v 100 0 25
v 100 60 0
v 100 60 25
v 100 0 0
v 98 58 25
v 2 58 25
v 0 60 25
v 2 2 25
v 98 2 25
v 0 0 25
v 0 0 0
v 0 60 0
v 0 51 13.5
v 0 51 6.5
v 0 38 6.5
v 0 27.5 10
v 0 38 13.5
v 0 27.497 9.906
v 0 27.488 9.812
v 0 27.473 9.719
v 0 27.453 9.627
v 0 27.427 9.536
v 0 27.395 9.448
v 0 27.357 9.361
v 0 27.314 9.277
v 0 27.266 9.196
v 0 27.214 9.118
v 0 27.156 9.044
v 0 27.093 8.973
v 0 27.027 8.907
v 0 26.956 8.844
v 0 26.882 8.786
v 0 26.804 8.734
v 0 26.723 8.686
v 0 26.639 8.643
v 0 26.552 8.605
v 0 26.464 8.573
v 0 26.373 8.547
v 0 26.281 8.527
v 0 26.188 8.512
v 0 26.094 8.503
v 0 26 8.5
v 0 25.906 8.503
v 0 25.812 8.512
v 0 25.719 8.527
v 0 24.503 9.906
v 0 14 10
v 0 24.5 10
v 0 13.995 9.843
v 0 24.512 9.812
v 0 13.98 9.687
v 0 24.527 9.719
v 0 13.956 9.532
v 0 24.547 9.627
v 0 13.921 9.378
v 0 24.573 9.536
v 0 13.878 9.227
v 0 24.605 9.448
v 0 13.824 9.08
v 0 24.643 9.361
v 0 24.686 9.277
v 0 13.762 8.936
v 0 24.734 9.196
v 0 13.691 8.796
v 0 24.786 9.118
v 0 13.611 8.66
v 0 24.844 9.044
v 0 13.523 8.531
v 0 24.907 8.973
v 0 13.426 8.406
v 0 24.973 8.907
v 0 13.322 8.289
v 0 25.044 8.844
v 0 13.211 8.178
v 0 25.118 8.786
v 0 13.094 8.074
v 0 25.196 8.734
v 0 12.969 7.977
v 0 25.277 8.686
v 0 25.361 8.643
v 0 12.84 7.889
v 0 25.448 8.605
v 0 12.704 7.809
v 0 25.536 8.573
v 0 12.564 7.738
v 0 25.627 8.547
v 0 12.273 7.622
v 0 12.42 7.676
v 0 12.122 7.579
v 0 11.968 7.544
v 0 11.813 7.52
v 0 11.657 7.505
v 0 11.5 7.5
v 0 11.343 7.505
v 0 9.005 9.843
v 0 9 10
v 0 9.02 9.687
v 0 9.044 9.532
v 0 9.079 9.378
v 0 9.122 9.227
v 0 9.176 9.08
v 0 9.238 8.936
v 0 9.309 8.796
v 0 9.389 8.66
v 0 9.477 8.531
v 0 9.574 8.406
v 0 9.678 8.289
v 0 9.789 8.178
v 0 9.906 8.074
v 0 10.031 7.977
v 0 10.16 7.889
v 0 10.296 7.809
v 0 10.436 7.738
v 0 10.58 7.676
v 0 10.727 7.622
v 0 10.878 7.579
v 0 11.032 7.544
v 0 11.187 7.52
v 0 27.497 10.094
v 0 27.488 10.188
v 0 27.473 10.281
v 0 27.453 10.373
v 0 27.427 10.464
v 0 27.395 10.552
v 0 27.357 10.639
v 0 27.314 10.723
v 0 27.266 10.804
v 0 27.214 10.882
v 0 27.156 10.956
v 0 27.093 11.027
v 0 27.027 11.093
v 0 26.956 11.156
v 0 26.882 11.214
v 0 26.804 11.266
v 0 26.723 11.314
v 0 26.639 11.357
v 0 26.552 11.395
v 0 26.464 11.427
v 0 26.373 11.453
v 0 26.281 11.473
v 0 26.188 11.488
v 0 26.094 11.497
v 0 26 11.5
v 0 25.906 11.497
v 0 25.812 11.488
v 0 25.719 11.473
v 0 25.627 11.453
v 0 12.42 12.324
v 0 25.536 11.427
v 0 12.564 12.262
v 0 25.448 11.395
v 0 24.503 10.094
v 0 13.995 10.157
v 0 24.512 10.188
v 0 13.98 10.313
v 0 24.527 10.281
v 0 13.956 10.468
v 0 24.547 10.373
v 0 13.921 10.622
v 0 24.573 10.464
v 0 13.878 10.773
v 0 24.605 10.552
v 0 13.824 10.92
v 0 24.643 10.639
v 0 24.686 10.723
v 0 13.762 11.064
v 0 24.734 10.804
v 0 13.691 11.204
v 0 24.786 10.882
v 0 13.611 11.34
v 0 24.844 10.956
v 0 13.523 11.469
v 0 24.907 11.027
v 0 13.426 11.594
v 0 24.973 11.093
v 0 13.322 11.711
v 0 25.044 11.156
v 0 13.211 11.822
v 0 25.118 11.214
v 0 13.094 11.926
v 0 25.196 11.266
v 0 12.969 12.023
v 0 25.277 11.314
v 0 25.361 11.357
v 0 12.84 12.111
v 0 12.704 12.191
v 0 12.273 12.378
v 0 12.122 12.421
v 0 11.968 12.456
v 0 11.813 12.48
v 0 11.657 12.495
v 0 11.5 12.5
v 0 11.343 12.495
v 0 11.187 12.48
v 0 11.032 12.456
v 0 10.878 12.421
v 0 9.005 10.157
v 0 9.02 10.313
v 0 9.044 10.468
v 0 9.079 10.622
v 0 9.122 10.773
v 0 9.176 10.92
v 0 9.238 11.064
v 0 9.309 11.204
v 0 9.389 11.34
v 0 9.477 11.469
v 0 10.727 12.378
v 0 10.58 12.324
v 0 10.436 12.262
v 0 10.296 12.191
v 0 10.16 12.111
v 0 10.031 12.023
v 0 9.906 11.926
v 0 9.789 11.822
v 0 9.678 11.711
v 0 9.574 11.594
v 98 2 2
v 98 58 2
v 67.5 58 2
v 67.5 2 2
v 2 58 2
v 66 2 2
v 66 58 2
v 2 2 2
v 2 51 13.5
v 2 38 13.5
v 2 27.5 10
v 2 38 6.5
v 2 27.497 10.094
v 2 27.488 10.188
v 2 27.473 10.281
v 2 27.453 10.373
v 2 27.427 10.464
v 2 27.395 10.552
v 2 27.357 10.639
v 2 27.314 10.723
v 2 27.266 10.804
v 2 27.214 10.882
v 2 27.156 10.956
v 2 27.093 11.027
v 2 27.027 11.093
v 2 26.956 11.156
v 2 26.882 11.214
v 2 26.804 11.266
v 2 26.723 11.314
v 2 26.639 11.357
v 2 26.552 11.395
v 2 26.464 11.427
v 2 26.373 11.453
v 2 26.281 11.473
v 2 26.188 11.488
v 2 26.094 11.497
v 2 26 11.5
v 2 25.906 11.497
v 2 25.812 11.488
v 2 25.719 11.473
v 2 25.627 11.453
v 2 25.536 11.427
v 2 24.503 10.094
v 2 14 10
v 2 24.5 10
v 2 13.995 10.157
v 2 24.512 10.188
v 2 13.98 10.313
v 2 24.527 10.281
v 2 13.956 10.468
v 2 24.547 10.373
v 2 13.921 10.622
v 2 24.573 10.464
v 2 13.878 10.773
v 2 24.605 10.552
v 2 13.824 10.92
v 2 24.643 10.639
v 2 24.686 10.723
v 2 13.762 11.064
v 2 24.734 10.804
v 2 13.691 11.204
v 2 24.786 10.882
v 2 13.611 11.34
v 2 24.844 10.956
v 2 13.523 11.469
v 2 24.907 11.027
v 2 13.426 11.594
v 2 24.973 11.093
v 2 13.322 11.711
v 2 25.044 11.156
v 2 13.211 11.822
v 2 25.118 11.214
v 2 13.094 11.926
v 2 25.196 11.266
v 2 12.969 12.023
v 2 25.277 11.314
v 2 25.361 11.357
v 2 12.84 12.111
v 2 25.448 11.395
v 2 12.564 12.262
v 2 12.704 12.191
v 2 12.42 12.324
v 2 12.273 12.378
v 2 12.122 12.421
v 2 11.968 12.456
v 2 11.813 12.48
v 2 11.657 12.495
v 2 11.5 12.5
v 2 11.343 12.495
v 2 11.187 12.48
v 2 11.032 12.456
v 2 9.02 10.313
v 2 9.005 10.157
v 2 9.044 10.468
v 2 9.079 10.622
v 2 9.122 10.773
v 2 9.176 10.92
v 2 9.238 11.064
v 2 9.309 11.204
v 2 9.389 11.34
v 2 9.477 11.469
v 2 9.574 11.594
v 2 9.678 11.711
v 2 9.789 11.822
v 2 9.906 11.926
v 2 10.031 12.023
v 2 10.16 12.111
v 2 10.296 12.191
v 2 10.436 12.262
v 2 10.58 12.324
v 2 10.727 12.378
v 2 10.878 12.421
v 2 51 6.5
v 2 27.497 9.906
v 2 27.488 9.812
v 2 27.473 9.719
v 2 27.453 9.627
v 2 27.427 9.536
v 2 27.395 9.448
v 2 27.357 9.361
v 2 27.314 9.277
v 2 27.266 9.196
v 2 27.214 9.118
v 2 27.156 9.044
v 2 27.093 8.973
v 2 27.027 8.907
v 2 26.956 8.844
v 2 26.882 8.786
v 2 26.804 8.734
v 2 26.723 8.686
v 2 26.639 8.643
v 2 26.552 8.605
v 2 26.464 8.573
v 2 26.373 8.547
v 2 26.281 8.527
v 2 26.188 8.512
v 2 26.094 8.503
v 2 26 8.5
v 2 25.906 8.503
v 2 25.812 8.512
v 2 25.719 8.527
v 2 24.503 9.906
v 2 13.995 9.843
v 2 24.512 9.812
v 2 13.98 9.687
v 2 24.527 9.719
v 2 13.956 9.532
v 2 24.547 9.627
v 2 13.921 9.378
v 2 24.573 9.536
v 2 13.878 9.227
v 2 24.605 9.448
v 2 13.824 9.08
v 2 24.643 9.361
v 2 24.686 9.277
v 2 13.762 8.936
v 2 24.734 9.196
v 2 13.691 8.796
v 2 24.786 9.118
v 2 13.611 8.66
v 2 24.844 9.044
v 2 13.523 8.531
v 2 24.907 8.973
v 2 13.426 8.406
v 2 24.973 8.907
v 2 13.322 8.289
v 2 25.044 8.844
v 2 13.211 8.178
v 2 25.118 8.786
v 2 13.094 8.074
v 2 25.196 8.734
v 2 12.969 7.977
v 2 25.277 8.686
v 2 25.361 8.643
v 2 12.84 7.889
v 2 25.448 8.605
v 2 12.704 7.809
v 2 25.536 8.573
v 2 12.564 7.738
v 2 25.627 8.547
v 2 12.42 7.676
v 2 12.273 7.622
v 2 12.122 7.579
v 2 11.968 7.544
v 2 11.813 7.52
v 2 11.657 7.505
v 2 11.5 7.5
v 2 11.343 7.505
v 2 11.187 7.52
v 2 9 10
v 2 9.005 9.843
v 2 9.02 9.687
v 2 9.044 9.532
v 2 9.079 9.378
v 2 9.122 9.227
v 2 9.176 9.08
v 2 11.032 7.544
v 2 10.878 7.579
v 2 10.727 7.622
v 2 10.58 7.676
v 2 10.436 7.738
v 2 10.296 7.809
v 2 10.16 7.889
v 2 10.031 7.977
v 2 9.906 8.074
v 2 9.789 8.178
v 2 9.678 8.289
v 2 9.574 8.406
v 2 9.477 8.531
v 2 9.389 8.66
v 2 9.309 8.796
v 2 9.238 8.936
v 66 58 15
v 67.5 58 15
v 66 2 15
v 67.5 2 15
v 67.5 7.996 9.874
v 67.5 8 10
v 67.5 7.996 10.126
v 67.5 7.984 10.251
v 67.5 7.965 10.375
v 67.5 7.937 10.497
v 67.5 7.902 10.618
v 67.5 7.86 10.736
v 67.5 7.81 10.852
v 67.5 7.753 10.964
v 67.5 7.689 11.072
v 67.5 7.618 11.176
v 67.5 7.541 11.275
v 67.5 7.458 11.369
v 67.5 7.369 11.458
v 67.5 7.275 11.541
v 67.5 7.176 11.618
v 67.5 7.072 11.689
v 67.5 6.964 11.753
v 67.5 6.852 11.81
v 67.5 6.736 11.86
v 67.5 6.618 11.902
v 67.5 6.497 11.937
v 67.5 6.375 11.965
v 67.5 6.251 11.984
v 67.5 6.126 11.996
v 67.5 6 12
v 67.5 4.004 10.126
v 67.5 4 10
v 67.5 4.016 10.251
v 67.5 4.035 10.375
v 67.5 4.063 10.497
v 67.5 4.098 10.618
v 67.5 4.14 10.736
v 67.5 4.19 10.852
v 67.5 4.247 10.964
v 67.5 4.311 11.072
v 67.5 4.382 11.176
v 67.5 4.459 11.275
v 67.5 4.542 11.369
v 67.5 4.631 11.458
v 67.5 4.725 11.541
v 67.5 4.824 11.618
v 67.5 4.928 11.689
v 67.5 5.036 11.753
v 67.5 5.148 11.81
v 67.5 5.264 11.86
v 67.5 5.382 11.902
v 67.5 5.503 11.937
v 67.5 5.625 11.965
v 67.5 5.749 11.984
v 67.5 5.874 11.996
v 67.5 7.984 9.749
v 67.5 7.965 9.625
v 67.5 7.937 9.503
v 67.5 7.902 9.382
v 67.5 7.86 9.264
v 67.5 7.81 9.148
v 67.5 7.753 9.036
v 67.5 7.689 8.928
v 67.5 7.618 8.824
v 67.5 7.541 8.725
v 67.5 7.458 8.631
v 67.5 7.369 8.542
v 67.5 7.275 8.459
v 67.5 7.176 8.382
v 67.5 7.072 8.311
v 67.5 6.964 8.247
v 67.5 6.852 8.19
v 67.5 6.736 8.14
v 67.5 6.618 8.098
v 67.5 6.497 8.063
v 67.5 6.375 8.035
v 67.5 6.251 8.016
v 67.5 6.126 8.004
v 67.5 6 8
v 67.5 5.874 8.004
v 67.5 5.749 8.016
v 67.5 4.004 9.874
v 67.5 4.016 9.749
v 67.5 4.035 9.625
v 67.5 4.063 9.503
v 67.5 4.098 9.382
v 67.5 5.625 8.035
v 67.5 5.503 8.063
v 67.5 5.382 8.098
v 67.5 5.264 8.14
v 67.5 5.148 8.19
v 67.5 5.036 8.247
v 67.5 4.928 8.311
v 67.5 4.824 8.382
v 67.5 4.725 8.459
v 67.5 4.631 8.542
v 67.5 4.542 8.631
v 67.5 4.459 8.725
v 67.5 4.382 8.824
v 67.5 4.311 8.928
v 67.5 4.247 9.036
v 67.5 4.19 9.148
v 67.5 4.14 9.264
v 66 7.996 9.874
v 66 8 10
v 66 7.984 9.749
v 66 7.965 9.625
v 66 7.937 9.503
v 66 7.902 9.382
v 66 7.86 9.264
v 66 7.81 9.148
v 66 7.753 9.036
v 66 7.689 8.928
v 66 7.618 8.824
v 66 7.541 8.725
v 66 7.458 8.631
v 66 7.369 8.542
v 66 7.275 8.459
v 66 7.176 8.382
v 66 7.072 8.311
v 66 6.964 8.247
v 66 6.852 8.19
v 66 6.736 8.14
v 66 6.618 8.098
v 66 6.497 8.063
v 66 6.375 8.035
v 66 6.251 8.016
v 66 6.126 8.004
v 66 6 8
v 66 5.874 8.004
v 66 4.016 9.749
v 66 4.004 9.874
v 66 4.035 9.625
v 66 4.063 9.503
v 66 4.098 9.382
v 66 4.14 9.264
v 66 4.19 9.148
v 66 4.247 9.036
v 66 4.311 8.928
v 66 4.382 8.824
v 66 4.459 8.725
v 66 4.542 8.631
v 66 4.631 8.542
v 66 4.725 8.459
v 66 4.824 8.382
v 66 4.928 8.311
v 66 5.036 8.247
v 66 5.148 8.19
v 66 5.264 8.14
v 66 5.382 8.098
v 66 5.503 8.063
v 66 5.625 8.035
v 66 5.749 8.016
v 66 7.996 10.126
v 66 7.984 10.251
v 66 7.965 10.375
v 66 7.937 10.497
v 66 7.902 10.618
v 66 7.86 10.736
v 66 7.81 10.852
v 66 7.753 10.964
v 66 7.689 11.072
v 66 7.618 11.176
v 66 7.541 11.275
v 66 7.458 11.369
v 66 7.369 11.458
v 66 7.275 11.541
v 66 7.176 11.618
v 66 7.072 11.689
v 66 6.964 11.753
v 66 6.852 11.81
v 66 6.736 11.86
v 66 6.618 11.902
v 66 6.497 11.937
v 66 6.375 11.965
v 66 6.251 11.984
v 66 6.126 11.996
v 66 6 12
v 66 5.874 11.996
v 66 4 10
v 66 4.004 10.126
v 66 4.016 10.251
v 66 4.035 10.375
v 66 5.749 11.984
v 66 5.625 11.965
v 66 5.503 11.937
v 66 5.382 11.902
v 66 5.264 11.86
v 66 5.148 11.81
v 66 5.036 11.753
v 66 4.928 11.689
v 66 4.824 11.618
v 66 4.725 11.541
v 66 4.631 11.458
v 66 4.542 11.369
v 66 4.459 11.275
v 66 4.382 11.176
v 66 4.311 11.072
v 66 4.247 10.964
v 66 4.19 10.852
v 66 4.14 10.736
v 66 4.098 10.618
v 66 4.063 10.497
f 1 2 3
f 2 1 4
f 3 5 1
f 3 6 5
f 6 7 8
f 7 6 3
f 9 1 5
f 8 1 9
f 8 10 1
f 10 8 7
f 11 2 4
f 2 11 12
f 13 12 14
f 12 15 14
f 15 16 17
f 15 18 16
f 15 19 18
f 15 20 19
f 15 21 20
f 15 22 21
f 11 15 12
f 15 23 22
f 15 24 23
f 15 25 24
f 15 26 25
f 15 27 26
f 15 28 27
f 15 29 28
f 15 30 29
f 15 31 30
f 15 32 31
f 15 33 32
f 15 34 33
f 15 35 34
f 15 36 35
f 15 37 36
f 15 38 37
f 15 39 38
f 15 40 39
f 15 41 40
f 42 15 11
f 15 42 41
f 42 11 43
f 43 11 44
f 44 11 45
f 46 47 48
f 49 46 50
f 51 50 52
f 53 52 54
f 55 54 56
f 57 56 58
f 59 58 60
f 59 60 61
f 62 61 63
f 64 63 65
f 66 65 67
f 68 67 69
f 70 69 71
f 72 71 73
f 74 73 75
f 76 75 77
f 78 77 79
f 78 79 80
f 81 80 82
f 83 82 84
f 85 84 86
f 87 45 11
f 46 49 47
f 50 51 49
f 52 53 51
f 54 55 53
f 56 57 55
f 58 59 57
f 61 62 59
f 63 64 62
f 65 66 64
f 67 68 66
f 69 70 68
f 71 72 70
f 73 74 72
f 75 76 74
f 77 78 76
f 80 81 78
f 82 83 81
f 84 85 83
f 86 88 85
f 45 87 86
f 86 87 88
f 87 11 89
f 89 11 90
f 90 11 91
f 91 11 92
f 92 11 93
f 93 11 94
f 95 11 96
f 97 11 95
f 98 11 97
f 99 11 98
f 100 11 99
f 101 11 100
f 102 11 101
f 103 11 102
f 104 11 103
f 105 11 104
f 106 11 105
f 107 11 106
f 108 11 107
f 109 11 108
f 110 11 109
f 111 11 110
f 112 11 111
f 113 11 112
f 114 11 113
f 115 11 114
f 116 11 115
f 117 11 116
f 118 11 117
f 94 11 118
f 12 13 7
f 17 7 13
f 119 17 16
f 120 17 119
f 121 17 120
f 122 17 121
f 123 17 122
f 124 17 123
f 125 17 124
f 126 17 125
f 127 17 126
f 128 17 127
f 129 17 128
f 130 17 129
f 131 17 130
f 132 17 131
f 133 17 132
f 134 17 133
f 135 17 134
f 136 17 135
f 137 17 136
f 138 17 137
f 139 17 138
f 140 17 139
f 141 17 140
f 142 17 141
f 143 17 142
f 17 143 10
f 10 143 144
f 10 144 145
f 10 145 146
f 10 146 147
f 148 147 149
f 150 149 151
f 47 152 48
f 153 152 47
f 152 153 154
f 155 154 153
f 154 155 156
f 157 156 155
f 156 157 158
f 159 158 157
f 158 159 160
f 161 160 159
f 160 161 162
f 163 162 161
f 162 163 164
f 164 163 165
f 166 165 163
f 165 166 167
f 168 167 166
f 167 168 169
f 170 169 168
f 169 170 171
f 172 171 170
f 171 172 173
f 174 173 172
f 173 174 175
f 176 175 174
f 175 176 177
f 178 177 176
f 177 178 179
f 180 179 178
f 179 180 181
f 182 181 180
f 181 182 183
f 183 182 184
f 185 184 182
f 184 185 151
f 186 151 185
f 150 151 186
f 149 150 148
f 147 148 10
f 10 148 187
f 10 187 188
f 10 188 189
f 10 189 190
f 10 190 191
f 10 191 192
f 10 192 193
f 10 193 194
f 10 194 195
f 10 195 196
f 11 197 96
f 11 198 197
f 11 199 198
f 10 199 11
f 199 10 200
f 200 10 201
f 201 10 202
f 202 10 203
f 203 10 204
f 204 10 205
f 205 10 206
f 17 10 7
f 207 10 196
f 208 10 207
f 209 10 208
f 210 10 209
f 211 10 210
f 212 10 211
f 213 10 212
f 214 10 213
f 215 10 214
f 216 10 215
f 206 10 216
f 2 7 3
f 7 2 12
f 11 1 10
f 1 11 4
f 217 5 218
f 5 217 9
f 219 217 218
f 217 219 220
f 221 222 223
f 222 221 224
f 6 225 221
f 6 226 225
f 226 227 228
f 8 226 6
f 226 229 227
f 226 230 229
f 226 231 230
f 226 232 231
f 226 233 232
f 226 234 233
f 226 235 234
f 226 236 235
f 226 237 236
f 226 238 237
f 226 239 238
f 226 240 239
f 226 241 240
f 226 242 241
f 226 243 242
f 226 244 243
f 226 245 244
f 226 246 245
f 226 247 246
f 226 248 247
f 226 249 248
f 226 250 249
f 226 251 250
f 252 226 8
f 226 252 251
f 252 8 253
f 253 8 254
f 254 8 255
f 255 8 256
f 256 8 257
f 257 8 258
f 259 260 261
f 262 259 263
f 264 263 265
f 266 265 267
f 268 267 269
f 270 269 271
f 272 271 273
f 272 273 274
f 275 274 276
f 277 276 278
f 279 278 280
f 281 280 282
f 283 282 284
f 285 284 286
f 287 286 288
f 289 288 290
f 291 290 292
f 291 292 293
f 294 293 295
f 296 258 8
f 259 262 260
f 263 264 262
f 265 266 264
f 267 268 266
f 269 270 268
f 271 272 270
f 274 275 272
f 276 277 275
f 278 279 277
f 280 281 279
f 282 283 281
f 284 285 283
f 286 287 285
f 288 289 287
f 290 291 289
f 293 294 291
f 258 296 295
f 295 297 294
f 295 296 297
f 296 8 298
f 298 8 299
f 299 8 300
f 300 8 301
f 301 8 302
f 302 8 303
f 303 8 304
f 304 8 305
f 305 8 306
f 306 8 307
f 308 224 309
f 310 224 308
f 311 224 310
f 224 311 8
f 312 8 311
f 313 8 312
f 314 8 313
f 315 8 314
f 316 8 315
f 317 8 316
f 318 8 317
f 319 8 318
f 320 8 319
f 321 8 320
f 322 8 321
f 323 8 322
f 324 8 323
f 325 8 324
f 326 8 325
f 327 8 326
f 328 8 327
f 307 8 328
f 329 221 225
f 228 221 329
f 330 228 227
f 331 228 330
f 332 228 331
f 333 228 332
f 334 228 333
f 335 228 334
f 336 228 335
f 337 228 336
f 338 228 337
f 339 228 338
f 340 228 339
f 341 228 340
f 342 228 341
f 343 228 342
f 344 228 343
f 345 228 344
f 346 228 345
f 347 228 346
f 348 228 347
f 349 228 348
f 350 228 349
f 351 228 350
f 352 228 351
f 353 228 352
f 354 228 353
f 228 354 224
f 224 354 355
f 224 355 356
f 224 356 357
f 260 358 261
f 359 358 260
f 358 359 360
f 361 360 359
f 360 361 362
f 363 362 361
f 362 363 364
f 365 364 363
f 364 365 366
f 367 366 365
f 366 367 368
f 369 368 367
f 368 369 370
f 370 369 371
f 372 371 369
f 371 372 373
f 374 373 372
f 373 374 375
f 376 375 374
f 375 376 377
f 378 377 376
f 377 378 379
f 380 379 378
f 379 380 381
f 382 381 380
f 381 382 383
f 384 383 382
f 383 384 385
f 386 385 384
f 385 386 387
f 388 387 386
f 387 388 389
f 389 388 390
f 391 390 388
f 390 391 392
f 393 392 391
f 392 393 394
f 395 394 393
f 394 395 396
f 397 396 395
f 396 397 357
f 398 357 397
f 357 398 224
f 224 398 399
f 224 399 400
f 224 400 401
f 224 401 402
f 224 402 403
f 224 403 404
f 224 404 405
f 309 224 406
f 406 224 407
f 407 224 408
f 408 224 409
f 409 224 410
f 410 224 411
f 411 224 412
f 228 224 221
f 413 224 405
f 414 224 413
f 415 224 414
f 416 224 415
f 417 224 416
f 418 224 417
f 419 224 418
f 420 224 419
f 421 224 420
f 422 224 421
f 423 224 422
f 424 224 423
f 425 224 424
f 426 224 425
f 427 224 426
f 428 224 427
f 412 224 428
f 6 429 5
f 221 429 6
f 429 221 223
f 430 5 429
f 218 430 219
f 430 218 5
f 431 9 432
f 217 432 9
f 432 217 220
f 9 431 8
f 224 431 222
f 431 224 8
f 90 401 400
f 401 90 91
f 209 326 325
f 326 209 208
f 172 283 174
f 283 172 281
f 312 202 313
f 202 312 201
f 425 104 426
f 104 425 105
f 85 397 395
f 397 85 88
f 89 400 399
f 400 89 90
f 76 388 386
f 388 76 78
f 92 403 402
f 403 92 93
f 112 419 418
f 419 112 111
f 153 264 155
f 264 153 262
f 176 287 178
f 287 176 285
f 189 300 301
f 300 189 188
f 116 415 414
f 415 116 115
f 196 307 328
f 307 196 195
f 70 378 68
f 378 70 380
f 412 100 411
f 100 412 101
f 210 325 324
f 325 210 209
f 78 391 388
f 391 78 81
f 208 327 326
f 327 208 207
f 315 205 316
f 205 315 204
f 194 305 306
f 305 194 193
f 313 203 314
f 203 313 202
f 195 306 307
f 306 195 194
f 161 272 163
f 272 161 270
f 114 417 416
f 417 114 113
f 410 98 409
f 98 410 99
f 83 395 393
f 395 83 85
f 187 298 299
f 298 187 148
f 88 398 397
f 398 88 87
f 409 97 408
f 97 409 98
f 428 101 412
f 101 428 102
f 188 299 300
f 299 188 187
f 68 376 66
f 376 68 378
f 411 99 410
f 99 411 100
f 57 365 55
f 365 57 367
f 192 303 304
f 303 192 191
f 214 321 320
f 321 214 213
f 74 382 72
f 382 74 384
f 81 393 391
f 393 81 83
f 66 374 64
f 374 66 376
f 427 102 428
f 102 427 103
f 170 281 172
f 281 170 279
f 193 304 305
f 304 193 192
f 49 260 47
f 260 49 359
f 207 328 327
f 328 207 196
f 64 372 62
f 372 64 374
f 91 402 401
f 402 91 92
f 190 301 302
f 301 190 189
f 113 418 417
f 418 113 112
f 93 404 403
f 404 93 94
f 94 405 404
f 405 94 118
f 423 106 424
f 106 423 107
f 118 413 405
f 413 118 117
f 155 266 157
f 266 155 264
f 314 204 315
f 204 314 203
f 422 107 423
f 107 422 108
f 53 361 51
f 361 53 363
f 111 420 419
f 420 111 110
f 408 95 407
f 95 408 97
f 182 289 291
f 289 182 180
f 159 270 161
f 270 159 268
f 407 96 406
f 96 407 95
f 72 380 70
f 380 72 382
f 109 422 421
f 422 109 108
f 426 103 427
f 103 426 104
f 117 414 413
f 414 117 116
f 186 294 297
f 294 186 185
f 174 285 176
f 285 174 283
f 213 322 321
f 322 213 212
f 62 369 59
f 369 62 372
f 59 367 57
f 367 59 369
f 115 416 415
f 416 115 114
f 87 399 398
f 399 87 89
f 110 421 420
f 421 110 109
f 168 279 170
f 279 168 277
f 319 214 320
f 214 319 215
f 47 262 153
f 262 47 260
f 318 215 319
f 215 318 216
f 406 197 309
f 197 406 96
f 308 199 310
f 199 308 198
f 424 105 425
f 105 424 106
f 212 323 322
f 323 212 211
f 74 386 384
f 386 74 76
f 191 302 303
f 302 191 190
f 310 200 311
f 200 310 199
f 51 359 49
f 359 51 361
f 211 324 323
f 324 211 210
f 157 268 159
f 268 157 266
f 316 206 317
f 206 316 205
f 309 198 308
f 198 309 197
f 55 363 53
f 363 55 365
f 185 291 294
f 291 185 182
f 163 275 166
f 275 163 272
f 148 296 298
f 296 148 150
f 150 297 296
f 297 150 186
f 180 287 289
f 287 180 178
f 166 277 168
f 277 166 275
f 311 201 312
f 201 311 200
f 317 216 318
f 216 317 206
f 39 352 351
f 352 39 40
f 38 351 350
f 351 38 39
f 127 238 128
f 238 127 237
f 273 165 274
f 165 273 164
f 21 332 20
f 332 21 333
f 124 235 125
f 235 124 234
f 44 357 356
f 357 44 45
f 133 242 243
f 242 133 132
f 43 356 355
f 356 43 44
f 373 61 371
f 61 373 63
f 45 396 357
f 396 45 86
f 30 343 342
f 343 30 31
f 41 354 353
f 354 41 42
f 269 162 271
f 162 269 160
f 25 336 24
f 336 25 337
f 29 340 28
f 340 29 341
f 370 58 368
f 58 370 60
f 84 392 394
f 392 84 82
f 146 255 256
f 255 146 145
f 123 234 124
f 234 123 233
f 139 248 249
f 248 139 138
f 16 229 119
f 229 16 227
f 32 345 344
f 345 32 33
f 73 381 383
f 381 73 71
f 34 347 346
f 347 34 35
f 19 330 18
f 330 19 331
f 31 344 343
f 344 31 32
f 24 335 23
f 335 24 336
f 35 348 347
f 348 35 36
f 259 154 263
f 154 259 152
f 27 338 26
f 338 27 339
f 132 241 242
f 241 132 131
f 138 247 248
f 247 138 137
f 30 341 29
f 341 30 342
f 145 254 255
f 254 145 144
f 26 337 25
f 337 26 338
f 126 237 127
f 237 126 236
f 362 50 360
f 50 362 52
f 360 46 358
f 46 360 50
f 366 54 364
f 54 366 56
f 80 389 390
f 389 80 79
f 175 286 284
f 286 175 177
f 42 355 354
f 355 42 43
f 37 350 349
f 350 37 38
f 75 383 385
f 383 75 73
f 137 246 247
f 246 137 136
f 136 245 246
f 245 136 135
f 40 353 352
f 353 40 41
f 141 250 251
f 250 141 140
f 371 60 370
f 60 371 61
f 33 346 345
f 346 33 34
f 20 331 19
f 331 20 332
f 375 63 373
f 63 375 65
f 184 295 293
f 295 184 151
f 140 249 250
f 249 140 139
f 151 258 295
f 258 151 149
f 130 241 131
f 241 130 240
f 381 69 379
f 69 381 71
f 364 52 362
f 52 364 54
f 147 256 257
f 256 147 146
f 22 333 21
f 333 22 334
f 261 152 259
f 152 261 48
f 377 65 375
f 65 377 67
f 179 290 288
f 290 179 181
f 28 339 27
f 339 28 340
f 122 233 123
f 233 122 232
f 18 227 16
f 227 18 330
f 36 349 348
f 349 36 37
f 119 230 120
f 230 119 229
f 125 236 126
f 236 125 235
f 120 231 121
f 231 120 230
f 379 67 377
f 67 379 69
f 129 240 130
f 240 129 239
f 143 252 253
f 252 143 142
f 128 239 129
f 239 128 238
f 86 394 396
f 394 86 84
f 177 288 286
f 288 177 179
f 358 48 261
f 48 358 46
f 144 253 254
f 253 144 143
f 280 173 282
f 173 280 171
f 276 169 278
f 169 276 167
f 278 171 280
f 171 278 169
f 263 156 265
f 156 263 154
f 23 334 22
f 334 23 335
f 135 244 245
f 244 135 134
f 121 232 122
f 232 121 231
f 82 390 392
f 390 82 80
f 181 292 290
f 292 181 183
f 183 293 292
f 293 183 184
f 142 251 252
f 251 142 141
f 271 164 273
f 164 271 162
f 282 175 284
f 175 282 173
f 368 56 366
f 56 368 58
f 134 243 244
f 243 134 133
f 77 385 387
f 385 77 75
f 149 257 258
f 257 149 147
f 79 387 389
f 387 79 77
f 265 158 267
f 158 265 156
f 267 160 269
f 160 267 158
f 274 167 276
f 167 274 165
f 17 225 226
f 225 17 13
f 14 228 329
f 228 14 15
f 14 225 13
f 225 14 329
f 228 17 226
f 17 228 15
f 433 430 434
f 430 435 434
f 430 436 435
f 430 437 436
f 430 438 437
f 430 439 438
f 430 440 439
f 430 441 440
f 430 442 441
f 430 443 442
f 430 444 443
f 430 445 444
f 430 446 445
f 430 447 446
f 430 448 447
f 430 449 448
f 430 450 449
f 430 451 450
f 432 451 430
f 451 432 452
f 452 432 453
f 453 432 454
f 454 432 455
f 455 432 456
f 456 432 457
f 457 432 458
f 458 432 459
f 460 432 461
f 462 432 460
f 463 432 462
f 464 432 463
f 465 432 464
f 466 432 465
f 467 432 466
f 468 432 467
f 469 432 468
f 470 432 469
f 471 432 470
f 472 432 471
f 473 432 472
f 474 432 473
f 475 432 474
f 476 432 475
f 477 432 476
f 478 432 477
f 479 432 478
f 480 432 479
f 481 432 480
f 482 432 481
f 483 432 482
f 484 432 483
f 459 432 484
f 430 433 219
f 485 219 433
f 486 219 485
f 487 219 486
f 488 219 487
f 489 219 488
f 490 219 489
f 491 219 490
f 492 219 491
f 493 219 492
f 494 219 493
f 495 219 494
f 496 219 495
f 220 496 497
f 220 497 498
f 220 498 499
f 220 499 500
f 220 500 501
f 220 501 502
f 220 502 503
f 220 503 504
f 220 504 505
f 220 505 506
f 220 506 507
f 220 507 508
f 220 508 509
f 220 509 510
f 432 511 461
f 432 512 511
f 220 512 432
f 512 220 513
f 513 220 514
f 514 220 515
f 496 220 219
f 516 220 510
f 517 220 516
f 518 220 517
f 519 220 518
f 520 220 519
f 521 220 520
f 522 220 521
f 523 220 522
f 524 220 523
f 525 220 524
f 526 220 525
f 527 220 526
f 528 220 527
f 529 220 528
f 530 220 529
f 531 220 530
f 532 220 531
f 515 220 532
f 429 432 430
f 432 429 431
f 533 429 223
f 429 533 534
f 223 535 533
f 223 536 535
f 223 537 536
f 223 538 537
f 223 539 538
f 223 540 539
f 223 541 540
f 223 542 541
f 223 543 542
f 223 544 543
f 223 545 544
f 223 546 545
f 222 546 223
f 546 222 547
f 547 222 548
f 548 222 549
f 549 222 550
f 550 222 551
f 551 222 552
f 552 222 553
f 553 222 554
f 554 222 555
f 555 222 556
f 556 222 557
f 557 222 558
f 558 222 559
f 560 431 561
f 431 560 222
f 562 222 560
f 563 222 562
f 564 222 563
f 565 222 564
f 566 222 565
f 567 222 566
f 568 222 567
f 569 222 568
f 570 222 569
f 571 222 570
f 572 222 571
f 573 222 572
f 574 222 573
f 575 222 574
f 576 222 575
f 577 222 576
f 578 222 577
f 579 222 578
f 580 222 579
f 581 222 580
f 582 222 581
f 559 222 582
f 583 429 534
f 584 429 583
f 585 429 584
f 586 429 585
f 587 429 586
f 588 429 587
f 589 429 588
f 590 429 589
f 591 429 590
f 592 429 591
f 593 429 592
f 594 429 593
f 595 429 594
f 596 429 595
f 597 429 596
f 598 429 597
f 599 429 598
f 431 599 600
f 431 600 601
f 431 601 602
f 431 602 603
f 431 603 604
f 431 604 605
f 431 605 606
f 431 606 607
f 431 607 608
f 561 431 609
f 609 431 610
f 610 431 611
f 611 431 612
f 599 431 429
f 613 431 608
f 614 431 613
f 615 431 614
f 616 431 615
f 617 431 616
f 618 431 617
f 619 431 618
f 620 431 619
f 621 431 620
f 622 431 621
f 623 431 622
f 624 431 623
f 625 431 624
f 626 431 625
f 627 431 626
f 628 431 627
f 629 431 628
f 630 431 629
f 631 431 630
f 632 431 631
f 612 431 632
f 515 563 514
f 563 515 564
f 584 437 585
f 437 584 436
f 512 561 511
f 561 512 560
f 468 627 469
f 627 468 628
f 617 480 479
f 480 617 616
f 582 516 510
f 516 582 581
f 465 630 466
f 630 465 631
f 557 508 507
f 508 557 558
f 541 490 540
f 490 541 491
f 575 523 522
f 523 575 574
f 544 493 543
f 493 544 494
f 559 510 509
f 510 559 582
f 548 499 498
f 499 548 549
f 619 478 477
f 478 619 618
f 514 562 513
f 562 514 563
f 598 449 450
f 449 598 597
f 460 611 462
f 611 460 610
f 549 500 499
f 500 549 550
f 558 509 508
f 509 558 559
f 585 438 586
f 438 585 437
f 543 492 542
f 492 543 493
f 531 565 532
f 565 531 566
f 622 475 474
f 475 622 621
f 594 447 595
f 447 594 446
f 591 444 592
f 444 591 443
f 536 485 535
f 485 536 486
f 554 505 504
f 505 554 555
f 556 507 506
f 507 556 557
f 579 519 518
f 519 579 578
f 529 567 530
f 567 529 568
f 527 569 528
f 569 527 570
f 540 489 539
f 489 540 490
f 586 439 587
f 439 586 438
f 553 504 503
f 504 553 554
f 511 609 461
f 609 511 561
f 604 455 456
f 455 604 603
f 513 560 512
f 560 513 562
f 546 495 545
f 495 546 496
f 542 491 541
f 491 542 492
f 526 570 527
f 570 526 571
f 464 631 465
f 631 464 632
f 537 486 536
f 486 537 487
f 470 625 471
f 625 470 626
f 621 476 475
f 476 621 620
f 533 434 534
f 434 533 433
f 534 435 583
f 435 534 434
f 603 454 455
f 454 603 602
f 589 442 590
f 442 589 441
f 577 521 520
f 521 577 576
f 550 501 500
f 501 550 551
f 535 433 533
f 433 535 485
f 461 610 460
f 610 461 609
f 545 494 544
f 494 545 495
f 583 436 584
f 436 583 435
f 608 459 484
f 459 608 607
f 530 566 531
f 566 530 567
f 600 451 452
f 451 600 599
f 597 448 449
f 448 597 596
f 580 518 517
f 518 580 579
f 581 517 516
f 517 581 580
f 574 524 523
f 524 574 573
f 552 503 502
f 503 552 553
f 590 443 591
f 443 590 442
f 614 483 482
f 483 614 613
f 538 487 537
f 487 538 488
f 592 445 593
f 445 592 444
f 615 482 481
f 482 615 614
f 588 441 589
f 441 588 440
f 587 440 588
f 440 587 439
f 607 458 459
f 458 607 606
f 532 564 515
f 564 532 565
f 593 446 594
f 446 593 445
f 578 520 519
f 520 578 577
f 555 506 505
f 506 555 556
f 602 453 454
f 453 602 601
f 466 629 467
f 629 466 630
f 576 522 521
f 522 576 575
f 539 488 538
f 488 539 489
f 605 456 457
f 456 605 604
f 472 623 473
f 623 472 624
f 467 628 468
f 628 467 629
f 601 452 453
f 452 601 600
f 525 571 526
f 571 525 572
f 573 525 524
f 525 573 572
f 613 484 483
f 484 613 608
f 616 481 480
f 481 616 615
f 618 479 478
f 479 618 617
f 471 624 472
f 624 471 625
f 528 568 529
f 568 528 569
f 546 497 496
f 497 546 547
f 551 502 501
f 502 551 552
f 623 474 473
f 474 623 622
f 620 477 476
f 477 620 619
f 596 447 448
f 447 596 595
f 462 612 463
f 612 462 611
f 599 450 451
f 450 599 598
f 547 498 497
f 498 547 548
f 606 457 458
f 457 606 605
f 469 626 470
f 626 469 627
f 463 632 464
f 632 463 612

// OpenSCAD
/* Gabinete para probador de continuidad
   CEKIT - 08/02/2021
*/

union(){
    // cubo principal
    difference() {  
        cube([100,60,25]);
        translate([2,2,2])
        cube([96,56,27]);
        // taladro jack
        translate([-1,11.5,10])
        rotate([0, 90, 0])
        cylinder(r=2.5,h=4, $fn=100);
        // taladro LED
        translate([-1,26,10])
        rotate([0, 90, 0])
        cylinder(r=1.5,h=4, $fn=100);
        // taladro llave
        translate([-0,38,6.5])
        cube([5,13,7]);
    }

    // división para batería 9V
    difference(){
        translate([66,0,0])
        cube([1.5,60,15]);
        translate([66,6,10])
        rotate([0, 90, 0])
        cylinder(r=2,h=4, $fn=100);
    }
}
